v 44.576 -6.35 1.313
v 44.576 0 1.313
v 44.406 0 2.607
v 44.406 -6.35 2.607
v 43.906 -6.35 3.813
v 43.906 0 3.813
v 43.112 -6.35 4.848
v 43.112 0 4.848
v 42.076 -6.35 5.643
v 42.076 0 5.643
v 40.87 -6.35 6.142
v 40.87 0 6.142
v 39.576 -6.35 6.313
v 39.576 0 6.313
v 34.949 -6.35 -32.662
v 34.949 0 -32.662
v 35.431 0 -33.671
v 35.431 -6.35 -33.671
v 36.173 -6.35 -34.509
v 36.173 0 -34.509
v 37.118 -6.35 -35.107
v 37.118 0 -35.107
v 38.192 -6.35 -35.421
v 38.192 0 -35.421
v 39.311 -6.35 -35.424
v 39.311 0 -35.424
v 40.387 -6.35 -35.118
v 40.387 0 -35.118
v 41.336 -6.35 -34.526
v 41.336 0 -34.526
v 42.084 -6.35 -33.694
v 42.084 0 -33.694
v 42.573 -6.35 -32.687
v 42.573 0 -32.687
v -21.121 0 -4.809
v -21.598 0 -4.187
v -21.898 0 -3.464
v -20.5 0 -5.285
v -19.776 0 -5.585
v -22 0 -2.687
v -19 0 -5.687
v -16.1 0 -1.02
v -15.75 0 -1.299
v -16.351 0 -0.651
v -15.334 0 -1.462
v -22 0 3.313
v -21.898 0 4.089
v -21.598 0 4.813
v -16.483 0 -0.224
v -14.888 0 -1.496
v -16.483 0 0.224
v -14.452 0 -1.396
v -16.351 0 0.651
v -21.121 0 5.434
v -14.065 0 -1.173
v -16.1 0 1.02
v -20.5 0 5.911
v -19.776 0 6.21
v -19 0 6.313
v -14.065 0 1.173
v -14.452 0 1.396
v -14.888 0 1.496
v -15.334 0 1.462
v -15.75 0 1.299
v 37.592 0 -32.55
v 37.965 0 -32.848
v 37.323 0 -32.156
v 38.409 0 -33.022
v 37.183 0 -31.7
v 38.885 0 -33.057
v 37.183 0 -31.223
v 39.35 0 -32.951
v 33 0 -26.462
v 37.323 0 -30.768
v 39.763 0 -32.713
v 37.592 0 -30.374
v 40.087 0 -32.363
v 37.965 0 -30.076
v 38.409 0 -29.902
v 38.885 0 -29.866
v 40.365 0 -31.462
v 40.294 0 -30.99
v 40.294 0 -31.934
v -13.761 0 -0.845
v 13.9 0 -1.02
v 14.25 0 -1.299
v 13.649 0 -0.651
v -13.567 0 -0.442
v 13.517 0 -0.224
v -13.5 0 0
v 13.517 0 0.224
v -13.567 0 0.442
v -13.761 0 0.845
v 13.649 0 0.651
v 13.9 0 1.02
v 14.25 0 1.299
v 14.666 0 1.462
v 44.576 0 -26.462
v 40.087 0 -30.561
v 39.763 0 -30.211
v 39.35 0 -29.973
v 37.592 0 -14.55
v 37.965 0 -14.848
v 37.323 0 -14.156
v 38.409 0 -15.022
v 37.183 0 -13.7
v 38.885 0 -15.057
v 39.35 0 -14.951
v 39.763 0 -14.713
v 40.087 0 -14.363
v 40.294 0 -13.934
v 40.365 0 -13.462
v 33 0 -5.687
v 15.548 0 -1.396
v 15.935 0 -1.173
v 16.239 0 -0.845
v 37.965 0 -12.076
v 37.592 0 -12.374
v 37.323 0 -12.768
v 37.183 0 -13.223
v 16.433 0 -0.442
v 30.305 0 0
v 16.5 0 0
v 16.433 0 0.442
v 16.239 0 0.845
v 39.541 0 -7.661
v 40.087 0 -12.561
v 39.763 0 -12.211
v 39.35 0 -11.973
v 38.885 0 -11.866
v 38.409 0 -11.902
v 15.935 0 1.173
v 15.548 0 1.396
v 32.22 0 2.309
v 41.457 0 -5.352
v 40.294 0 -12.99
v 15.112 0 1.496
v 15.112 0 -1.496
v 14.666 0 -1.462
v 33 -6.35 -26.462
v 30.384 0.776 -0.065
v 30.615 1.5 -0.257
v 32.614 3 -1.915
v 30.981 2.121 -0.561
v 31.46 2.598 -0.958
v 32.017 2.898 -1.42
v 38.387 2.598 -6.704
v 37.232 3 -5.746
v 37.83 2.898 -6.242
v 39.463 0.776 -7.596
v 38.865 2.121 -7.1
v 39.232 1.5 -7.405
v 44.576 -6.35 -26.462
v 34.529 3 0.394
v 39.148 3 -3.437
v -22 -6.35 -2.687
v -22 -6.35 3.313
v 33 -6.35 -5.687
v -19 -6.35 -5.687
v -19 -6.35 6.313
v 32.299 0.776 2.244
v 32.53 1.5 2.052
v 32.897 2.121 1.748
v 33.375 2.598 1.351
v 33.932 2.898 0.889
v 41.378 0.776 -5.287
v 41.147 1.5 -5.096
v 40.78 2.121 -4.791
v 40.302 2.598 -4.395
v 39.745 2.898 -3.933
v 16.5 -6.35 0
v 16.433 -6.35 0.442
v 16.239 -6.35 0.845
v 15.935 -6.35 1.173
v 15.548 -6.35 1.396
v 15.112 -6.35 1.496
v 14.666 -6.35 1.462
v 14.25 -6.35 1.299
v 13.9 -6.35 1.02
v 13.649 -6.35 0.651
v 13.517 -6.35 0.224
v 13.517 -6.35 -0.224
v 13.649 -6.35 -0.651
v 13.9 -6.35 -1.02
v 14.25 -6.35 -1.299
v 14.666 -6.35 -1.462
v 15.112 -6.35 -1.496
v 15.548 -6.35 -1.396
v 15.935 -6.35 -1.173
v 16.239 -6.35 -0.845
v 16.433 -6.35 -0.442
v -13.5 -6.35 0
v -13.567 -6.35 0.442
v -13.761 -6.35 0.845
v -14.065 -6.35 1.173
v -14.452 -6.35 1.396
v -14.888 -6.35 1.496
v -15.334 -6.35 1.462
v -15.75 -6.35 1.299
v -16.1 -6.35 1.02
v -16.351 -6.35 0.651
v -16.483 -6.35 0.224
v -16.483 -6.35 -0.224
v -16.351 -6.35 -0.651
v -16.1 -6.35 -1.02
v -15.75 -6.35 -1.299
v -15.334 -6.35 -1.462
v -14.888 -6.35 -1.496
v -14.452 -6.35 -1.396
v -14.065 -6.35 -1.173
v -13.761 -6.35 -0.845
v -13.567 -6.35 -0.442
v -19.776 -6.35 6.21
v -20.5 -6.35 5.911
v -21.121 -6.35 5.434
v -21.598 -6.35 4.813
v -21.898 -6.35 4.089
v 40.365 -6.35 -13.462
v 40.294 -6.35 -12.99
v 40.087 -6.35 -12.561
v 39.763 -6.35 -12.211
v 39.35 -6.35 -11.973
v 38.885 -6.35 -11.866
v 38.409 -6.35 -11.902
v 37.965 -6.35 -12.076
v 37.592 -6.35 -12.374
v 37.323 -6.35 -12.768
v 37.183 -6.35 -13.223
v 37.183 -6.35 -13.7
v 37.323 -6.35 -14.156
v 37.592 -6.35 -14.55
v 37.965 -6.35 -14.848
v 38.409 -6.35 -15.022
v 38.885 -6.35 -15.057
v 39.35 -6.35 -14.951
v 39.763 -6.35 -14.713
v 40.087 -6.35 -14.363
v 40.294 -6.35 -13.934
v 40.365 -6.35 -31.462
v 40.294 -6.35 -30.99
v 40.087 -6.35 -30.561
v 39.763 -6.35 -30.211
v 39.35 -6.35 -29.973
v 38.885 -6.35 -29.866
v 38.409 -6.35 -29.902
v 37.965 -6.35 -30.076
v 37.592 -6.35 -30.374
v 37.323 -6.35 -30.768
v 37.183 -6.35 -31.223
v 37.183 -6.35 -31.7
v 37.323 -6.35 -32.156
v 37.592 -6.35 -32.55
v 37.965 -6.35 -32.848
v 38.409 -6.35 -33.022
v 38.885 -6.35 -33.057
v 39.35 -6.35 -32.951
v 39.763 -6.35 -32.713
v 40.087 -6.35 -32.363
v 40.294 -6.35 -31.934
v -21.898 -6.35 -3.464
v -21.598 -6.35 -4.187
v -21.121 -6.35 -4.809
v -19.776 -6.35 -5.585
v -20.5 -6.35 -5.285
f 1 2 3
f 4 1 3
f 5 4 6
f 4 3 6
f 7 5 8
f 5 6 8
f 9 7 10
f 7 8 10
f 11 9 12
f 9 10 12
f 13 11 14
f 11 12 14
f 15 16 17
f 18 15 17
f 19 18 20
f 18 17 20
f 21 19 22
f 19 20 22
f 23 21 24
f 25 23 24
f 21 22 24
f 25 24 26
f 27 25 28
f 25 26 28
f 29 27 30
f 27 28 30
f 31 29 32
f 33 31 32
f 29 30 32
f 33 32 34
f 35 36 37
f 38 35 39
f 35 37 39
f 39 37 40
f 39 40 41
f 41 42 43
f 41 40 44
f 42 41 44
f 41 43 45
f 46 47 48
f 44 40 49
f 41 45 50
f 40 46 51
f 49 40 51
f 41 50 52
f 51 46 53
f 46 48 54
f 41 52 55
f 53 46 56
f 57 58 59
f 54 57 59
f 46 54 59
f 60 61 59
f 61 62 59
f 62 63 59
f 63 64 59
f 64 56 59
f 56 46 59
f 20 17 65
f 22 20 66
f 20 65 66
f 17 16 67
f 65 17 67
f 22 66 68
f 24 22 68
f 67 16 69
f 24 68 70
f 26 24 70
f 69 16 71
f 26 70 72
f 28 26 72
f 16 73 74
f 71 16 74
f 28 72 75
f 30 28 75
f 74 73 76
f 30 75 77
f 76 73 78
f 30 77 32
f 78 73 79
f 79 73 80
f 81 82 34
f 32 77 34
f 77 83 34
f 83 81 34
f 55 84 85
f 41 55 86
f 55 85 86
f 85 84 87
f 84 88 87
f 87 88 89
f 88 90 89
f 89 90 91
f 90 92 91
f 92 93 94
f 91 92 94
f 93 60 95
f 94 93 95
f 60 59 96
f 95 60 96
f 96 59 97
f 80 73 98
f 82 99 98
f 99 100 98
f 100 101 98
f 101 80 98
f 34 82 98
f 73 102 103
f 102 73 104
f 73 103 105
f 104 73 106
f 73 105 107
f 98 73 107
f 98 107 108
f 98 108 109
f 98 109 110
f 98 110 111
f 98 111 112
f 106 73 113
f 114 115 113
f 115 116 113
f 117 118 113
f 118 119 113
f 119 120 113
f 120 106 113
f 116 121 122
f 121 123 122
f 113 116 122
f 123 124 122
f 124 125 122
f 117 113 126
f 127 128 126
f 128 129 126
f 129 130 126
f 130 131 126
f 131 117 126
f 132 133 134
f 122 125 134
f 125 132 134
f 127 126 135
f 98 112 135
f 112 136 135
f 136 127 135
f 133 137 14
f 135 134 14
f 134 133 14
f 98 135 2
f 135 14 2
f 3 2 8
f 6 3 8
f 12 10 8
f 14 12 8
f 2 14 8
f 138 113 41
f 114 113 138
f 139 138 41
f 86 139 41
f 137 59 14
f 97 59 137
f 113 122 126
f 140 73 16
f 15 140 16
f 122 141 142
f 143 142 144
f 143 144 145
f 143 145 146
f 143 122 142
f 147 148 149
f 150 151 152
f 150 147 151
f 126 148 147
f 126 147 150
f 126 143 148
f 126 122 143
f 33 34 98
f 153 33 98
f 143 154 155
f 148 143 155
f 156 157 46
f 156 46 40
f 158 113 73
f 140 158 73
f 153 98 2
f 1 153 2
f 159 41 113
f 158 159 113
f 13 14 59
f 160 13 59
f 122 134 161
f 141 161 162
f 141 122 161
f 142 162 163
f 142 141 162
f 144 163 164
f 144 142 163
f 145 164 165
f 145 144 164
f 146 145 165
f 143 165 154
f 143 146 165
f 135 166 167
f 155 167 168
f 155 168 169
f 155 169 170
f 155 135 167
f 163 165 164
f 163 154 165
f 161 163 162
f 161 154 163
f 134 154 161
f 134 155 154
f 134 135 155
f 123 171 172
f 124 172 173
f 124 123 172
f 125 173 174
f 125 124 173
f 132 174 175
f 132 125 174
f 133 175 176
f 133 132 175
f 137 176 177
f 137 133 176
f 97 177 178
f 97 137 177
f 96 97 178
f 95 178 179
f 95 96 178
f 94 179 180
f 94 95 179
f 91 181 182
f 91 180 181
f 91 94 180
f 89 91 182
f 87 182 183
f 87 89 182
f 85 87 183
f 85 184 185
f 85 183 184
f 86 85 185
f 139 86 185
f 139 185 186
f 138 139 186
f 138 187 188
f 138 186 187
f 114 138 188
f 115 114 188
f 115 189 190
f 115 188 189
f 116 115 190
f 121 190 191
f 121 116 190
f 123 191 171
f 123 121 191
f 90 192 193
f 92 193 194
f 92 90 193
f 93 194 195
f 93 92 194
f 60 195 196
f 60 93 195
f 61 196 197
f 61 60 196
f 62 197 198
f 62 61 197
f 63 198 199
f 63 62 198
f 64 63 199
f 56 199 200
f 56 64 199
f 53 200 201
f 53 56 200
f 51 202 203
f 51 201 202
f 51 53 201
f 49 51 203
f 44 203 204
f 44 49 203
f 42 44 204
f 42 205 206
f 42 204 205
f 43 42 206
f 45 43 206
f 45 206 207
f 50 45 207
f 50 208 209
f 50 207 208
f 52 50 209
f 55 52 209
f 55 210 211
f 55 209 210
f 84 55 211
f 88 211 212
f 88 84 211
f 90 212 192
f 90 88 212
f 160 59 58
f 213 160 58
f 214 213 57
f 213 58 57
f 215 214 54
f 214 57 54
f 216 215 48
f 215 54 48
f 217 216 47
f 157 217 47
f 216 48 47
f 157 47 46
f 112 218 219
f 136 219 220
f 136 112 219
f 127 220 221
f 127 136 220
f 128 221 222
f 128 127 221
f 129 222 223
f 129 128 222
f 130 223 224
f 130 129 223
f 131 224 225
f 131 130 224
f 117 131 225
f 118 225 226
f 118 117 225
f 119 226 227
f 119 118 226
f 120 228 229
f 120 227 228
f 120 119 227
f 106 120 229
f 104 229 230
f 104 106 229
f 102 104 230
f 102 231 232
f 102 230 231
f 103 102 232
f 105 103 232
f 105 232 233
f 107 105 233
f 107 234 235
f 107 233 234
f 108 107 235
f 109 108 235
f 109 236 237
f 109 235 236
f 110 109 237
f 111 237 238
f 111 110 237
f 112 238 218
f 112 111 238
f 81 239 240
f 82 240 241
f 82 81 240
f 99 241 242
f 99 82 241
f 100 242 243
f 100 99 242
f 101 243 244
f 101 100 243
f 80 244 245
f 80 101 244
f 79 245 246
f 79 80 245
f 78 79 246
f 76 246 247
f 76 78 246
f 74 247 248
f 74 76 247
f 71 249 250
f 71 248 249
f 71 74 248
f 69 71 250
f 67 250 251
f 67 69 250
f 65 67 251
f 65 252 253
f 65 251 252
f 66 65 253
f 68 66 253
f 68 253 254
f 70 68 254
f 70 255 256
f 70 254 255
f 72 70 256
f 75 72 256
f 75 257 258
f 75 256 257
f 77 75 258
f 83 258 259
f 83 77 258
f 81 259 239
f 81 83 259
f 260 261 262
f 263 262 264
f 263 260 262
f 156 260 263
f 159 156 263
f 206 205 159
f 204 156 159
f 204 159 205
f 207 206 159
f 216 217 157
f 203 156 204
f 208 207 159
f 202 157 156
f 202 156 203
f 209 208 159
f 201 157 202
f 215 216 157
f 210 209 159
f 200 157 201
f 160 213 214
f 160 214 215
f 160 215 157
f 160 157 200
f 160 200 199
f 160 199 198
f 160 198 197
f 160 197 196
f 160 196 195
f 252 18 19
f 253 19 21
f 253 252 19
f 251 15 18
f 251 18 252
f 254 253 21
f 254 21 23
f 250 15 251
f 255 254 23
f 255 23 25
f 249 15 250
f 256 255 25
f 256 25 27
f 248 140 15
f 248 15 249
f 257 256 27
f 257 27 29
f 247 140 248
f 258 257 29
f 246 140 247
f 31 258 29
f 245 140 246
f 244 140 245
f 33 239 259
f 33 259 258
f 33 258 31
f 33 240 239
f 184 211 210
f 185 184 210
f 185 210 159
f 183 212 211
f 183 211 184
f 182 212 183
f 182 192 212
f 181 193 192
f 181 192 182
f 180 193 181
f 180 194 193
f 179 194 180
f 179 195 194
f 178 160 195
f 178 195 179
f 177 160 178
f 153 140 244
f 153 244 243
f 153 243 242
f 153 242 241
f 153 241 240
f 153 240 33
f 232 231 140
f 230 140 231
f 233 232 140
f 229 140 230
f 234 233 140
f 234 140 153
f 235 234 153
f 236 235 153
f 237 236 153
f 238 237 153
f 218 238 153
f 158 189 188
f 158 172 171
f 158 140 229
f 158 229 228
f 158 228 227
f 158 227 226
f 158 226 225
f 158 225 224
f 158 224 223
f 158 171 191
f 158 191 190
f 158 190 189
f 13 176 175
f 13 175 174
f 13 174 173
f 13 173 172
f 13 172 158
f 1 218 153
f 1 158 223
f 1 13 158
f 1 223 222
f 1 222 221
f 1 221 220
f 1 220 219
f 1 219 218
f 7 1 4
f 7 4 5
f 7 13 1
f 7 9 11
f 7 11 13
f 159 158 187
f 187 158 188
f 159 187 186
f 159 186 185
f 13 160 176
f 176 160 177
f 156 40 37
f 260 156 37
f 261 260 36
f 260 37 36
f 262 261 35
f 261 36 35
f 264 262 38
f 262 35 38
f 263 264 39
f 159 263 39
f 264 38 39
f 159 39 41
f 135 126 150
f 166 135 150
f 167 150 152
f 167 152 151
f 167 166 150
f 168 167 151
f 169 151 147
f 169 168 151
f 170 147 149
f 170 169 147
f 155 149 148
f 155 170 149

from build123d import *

# Parameters (mm, degrees)
F1_DEPTH = 6.35
F2_R     = 1.5
F2_R_2   = 1.6
F3_DEPTH = 6.351
F5_DEPTH = 3
F6_R     = 2.99999


# Not quite as in the source:
# - a fillet or chamfer is up to 0.001 mm smaller than in the source, because OpenCascade refuses the exact size


with BuildPart() as f1:
    # F0 (on Front) → F1 (new body)
    with BuildSketch(Plane.XZ):
        with BuildLine():
            Line((33, 6.3125771578), (-19, 6.3125771578))
            ThreePointArc((-19, 6.3125771578), (-21.1213203436, 5.4338975014), (-22, 3.3125771578))
            Line((-22, 3.3125771578), (-22, -2.6874228422))
            ThreePointArc((-22, -2.6874228422), (-21.1213203436, -4.8087431858), (-19, -5.6874228422))
            Line((-19, -5.6874228422), (33, -5.6874228422))
            Line((33, -5.6874228422), (33, -18.461904466))
            Line((33, -18.461904466), (33, -26.461904466))
            Line((33, -26.461904466), (34.9491434073, -32.6615871174))
            ThreePointArc((34.9491434073, -32.6615871174), (38.7515149865, -35.4618817353), (42.5726810332, -32.6872881404))
            Line((42.5726810332, -32.6872881404), (44.5761270821, -26.461904466))
            Line((44.5761270821, -26.461904466), (44.5761270821, -18.461904466))
            Line((44.5761270821, -18.461904466), (44.5761270821, 1.3125771578))
            ThreePointArc((44.5761270821, 1.3125771578), (43.111660988, 4.8481110637), (39.5761270821, 6.3125771578))
            Line((39.5761270821, 6.3125771578), (33, 6.3125771578))
        make_face()
    extrude(amount=F1_DEPTH)

    # F2 (on face) → F3 (cut, through all)
    with BuildSketch(Plane.XZ):
        with Locations((-15, 0)):
            Circle(F2_R)
        with Locations((15, 0)):
            Circle(F2_R)
        with Locations((38.765, -13.461904466)):
            Circle(F2_R_2)
        with Locations((38.765, -31.461904466)):
            Circle(F2_R_2)
    extrude(amount=F3_DEPTH, mode=Mode.SUBTRACT)

    # F4 (on face) → F5 (join)
    with BuildSketch(Plane.XZ):
        Polygon((41.4565890705, -5.352164329), (32.2204606053, 2.3090321163), (30.305161494, 0), (39.5412899592, -7.6611964453), align=None)
    extrude(amount=-F5_DEPTH)

    # F6 (radius 3 in the source; OpenCascade refuses exactly that, so slightly less here)
    f6_edges = [f1.edges().sort_by_distance(p)[0] for p in [
        (31.262811, 3, 1.154516),
        (40.49894, 3, -6.50668),
    ]]
    fillet(f6_edges, radius=F6_R)


solid = f1.part
